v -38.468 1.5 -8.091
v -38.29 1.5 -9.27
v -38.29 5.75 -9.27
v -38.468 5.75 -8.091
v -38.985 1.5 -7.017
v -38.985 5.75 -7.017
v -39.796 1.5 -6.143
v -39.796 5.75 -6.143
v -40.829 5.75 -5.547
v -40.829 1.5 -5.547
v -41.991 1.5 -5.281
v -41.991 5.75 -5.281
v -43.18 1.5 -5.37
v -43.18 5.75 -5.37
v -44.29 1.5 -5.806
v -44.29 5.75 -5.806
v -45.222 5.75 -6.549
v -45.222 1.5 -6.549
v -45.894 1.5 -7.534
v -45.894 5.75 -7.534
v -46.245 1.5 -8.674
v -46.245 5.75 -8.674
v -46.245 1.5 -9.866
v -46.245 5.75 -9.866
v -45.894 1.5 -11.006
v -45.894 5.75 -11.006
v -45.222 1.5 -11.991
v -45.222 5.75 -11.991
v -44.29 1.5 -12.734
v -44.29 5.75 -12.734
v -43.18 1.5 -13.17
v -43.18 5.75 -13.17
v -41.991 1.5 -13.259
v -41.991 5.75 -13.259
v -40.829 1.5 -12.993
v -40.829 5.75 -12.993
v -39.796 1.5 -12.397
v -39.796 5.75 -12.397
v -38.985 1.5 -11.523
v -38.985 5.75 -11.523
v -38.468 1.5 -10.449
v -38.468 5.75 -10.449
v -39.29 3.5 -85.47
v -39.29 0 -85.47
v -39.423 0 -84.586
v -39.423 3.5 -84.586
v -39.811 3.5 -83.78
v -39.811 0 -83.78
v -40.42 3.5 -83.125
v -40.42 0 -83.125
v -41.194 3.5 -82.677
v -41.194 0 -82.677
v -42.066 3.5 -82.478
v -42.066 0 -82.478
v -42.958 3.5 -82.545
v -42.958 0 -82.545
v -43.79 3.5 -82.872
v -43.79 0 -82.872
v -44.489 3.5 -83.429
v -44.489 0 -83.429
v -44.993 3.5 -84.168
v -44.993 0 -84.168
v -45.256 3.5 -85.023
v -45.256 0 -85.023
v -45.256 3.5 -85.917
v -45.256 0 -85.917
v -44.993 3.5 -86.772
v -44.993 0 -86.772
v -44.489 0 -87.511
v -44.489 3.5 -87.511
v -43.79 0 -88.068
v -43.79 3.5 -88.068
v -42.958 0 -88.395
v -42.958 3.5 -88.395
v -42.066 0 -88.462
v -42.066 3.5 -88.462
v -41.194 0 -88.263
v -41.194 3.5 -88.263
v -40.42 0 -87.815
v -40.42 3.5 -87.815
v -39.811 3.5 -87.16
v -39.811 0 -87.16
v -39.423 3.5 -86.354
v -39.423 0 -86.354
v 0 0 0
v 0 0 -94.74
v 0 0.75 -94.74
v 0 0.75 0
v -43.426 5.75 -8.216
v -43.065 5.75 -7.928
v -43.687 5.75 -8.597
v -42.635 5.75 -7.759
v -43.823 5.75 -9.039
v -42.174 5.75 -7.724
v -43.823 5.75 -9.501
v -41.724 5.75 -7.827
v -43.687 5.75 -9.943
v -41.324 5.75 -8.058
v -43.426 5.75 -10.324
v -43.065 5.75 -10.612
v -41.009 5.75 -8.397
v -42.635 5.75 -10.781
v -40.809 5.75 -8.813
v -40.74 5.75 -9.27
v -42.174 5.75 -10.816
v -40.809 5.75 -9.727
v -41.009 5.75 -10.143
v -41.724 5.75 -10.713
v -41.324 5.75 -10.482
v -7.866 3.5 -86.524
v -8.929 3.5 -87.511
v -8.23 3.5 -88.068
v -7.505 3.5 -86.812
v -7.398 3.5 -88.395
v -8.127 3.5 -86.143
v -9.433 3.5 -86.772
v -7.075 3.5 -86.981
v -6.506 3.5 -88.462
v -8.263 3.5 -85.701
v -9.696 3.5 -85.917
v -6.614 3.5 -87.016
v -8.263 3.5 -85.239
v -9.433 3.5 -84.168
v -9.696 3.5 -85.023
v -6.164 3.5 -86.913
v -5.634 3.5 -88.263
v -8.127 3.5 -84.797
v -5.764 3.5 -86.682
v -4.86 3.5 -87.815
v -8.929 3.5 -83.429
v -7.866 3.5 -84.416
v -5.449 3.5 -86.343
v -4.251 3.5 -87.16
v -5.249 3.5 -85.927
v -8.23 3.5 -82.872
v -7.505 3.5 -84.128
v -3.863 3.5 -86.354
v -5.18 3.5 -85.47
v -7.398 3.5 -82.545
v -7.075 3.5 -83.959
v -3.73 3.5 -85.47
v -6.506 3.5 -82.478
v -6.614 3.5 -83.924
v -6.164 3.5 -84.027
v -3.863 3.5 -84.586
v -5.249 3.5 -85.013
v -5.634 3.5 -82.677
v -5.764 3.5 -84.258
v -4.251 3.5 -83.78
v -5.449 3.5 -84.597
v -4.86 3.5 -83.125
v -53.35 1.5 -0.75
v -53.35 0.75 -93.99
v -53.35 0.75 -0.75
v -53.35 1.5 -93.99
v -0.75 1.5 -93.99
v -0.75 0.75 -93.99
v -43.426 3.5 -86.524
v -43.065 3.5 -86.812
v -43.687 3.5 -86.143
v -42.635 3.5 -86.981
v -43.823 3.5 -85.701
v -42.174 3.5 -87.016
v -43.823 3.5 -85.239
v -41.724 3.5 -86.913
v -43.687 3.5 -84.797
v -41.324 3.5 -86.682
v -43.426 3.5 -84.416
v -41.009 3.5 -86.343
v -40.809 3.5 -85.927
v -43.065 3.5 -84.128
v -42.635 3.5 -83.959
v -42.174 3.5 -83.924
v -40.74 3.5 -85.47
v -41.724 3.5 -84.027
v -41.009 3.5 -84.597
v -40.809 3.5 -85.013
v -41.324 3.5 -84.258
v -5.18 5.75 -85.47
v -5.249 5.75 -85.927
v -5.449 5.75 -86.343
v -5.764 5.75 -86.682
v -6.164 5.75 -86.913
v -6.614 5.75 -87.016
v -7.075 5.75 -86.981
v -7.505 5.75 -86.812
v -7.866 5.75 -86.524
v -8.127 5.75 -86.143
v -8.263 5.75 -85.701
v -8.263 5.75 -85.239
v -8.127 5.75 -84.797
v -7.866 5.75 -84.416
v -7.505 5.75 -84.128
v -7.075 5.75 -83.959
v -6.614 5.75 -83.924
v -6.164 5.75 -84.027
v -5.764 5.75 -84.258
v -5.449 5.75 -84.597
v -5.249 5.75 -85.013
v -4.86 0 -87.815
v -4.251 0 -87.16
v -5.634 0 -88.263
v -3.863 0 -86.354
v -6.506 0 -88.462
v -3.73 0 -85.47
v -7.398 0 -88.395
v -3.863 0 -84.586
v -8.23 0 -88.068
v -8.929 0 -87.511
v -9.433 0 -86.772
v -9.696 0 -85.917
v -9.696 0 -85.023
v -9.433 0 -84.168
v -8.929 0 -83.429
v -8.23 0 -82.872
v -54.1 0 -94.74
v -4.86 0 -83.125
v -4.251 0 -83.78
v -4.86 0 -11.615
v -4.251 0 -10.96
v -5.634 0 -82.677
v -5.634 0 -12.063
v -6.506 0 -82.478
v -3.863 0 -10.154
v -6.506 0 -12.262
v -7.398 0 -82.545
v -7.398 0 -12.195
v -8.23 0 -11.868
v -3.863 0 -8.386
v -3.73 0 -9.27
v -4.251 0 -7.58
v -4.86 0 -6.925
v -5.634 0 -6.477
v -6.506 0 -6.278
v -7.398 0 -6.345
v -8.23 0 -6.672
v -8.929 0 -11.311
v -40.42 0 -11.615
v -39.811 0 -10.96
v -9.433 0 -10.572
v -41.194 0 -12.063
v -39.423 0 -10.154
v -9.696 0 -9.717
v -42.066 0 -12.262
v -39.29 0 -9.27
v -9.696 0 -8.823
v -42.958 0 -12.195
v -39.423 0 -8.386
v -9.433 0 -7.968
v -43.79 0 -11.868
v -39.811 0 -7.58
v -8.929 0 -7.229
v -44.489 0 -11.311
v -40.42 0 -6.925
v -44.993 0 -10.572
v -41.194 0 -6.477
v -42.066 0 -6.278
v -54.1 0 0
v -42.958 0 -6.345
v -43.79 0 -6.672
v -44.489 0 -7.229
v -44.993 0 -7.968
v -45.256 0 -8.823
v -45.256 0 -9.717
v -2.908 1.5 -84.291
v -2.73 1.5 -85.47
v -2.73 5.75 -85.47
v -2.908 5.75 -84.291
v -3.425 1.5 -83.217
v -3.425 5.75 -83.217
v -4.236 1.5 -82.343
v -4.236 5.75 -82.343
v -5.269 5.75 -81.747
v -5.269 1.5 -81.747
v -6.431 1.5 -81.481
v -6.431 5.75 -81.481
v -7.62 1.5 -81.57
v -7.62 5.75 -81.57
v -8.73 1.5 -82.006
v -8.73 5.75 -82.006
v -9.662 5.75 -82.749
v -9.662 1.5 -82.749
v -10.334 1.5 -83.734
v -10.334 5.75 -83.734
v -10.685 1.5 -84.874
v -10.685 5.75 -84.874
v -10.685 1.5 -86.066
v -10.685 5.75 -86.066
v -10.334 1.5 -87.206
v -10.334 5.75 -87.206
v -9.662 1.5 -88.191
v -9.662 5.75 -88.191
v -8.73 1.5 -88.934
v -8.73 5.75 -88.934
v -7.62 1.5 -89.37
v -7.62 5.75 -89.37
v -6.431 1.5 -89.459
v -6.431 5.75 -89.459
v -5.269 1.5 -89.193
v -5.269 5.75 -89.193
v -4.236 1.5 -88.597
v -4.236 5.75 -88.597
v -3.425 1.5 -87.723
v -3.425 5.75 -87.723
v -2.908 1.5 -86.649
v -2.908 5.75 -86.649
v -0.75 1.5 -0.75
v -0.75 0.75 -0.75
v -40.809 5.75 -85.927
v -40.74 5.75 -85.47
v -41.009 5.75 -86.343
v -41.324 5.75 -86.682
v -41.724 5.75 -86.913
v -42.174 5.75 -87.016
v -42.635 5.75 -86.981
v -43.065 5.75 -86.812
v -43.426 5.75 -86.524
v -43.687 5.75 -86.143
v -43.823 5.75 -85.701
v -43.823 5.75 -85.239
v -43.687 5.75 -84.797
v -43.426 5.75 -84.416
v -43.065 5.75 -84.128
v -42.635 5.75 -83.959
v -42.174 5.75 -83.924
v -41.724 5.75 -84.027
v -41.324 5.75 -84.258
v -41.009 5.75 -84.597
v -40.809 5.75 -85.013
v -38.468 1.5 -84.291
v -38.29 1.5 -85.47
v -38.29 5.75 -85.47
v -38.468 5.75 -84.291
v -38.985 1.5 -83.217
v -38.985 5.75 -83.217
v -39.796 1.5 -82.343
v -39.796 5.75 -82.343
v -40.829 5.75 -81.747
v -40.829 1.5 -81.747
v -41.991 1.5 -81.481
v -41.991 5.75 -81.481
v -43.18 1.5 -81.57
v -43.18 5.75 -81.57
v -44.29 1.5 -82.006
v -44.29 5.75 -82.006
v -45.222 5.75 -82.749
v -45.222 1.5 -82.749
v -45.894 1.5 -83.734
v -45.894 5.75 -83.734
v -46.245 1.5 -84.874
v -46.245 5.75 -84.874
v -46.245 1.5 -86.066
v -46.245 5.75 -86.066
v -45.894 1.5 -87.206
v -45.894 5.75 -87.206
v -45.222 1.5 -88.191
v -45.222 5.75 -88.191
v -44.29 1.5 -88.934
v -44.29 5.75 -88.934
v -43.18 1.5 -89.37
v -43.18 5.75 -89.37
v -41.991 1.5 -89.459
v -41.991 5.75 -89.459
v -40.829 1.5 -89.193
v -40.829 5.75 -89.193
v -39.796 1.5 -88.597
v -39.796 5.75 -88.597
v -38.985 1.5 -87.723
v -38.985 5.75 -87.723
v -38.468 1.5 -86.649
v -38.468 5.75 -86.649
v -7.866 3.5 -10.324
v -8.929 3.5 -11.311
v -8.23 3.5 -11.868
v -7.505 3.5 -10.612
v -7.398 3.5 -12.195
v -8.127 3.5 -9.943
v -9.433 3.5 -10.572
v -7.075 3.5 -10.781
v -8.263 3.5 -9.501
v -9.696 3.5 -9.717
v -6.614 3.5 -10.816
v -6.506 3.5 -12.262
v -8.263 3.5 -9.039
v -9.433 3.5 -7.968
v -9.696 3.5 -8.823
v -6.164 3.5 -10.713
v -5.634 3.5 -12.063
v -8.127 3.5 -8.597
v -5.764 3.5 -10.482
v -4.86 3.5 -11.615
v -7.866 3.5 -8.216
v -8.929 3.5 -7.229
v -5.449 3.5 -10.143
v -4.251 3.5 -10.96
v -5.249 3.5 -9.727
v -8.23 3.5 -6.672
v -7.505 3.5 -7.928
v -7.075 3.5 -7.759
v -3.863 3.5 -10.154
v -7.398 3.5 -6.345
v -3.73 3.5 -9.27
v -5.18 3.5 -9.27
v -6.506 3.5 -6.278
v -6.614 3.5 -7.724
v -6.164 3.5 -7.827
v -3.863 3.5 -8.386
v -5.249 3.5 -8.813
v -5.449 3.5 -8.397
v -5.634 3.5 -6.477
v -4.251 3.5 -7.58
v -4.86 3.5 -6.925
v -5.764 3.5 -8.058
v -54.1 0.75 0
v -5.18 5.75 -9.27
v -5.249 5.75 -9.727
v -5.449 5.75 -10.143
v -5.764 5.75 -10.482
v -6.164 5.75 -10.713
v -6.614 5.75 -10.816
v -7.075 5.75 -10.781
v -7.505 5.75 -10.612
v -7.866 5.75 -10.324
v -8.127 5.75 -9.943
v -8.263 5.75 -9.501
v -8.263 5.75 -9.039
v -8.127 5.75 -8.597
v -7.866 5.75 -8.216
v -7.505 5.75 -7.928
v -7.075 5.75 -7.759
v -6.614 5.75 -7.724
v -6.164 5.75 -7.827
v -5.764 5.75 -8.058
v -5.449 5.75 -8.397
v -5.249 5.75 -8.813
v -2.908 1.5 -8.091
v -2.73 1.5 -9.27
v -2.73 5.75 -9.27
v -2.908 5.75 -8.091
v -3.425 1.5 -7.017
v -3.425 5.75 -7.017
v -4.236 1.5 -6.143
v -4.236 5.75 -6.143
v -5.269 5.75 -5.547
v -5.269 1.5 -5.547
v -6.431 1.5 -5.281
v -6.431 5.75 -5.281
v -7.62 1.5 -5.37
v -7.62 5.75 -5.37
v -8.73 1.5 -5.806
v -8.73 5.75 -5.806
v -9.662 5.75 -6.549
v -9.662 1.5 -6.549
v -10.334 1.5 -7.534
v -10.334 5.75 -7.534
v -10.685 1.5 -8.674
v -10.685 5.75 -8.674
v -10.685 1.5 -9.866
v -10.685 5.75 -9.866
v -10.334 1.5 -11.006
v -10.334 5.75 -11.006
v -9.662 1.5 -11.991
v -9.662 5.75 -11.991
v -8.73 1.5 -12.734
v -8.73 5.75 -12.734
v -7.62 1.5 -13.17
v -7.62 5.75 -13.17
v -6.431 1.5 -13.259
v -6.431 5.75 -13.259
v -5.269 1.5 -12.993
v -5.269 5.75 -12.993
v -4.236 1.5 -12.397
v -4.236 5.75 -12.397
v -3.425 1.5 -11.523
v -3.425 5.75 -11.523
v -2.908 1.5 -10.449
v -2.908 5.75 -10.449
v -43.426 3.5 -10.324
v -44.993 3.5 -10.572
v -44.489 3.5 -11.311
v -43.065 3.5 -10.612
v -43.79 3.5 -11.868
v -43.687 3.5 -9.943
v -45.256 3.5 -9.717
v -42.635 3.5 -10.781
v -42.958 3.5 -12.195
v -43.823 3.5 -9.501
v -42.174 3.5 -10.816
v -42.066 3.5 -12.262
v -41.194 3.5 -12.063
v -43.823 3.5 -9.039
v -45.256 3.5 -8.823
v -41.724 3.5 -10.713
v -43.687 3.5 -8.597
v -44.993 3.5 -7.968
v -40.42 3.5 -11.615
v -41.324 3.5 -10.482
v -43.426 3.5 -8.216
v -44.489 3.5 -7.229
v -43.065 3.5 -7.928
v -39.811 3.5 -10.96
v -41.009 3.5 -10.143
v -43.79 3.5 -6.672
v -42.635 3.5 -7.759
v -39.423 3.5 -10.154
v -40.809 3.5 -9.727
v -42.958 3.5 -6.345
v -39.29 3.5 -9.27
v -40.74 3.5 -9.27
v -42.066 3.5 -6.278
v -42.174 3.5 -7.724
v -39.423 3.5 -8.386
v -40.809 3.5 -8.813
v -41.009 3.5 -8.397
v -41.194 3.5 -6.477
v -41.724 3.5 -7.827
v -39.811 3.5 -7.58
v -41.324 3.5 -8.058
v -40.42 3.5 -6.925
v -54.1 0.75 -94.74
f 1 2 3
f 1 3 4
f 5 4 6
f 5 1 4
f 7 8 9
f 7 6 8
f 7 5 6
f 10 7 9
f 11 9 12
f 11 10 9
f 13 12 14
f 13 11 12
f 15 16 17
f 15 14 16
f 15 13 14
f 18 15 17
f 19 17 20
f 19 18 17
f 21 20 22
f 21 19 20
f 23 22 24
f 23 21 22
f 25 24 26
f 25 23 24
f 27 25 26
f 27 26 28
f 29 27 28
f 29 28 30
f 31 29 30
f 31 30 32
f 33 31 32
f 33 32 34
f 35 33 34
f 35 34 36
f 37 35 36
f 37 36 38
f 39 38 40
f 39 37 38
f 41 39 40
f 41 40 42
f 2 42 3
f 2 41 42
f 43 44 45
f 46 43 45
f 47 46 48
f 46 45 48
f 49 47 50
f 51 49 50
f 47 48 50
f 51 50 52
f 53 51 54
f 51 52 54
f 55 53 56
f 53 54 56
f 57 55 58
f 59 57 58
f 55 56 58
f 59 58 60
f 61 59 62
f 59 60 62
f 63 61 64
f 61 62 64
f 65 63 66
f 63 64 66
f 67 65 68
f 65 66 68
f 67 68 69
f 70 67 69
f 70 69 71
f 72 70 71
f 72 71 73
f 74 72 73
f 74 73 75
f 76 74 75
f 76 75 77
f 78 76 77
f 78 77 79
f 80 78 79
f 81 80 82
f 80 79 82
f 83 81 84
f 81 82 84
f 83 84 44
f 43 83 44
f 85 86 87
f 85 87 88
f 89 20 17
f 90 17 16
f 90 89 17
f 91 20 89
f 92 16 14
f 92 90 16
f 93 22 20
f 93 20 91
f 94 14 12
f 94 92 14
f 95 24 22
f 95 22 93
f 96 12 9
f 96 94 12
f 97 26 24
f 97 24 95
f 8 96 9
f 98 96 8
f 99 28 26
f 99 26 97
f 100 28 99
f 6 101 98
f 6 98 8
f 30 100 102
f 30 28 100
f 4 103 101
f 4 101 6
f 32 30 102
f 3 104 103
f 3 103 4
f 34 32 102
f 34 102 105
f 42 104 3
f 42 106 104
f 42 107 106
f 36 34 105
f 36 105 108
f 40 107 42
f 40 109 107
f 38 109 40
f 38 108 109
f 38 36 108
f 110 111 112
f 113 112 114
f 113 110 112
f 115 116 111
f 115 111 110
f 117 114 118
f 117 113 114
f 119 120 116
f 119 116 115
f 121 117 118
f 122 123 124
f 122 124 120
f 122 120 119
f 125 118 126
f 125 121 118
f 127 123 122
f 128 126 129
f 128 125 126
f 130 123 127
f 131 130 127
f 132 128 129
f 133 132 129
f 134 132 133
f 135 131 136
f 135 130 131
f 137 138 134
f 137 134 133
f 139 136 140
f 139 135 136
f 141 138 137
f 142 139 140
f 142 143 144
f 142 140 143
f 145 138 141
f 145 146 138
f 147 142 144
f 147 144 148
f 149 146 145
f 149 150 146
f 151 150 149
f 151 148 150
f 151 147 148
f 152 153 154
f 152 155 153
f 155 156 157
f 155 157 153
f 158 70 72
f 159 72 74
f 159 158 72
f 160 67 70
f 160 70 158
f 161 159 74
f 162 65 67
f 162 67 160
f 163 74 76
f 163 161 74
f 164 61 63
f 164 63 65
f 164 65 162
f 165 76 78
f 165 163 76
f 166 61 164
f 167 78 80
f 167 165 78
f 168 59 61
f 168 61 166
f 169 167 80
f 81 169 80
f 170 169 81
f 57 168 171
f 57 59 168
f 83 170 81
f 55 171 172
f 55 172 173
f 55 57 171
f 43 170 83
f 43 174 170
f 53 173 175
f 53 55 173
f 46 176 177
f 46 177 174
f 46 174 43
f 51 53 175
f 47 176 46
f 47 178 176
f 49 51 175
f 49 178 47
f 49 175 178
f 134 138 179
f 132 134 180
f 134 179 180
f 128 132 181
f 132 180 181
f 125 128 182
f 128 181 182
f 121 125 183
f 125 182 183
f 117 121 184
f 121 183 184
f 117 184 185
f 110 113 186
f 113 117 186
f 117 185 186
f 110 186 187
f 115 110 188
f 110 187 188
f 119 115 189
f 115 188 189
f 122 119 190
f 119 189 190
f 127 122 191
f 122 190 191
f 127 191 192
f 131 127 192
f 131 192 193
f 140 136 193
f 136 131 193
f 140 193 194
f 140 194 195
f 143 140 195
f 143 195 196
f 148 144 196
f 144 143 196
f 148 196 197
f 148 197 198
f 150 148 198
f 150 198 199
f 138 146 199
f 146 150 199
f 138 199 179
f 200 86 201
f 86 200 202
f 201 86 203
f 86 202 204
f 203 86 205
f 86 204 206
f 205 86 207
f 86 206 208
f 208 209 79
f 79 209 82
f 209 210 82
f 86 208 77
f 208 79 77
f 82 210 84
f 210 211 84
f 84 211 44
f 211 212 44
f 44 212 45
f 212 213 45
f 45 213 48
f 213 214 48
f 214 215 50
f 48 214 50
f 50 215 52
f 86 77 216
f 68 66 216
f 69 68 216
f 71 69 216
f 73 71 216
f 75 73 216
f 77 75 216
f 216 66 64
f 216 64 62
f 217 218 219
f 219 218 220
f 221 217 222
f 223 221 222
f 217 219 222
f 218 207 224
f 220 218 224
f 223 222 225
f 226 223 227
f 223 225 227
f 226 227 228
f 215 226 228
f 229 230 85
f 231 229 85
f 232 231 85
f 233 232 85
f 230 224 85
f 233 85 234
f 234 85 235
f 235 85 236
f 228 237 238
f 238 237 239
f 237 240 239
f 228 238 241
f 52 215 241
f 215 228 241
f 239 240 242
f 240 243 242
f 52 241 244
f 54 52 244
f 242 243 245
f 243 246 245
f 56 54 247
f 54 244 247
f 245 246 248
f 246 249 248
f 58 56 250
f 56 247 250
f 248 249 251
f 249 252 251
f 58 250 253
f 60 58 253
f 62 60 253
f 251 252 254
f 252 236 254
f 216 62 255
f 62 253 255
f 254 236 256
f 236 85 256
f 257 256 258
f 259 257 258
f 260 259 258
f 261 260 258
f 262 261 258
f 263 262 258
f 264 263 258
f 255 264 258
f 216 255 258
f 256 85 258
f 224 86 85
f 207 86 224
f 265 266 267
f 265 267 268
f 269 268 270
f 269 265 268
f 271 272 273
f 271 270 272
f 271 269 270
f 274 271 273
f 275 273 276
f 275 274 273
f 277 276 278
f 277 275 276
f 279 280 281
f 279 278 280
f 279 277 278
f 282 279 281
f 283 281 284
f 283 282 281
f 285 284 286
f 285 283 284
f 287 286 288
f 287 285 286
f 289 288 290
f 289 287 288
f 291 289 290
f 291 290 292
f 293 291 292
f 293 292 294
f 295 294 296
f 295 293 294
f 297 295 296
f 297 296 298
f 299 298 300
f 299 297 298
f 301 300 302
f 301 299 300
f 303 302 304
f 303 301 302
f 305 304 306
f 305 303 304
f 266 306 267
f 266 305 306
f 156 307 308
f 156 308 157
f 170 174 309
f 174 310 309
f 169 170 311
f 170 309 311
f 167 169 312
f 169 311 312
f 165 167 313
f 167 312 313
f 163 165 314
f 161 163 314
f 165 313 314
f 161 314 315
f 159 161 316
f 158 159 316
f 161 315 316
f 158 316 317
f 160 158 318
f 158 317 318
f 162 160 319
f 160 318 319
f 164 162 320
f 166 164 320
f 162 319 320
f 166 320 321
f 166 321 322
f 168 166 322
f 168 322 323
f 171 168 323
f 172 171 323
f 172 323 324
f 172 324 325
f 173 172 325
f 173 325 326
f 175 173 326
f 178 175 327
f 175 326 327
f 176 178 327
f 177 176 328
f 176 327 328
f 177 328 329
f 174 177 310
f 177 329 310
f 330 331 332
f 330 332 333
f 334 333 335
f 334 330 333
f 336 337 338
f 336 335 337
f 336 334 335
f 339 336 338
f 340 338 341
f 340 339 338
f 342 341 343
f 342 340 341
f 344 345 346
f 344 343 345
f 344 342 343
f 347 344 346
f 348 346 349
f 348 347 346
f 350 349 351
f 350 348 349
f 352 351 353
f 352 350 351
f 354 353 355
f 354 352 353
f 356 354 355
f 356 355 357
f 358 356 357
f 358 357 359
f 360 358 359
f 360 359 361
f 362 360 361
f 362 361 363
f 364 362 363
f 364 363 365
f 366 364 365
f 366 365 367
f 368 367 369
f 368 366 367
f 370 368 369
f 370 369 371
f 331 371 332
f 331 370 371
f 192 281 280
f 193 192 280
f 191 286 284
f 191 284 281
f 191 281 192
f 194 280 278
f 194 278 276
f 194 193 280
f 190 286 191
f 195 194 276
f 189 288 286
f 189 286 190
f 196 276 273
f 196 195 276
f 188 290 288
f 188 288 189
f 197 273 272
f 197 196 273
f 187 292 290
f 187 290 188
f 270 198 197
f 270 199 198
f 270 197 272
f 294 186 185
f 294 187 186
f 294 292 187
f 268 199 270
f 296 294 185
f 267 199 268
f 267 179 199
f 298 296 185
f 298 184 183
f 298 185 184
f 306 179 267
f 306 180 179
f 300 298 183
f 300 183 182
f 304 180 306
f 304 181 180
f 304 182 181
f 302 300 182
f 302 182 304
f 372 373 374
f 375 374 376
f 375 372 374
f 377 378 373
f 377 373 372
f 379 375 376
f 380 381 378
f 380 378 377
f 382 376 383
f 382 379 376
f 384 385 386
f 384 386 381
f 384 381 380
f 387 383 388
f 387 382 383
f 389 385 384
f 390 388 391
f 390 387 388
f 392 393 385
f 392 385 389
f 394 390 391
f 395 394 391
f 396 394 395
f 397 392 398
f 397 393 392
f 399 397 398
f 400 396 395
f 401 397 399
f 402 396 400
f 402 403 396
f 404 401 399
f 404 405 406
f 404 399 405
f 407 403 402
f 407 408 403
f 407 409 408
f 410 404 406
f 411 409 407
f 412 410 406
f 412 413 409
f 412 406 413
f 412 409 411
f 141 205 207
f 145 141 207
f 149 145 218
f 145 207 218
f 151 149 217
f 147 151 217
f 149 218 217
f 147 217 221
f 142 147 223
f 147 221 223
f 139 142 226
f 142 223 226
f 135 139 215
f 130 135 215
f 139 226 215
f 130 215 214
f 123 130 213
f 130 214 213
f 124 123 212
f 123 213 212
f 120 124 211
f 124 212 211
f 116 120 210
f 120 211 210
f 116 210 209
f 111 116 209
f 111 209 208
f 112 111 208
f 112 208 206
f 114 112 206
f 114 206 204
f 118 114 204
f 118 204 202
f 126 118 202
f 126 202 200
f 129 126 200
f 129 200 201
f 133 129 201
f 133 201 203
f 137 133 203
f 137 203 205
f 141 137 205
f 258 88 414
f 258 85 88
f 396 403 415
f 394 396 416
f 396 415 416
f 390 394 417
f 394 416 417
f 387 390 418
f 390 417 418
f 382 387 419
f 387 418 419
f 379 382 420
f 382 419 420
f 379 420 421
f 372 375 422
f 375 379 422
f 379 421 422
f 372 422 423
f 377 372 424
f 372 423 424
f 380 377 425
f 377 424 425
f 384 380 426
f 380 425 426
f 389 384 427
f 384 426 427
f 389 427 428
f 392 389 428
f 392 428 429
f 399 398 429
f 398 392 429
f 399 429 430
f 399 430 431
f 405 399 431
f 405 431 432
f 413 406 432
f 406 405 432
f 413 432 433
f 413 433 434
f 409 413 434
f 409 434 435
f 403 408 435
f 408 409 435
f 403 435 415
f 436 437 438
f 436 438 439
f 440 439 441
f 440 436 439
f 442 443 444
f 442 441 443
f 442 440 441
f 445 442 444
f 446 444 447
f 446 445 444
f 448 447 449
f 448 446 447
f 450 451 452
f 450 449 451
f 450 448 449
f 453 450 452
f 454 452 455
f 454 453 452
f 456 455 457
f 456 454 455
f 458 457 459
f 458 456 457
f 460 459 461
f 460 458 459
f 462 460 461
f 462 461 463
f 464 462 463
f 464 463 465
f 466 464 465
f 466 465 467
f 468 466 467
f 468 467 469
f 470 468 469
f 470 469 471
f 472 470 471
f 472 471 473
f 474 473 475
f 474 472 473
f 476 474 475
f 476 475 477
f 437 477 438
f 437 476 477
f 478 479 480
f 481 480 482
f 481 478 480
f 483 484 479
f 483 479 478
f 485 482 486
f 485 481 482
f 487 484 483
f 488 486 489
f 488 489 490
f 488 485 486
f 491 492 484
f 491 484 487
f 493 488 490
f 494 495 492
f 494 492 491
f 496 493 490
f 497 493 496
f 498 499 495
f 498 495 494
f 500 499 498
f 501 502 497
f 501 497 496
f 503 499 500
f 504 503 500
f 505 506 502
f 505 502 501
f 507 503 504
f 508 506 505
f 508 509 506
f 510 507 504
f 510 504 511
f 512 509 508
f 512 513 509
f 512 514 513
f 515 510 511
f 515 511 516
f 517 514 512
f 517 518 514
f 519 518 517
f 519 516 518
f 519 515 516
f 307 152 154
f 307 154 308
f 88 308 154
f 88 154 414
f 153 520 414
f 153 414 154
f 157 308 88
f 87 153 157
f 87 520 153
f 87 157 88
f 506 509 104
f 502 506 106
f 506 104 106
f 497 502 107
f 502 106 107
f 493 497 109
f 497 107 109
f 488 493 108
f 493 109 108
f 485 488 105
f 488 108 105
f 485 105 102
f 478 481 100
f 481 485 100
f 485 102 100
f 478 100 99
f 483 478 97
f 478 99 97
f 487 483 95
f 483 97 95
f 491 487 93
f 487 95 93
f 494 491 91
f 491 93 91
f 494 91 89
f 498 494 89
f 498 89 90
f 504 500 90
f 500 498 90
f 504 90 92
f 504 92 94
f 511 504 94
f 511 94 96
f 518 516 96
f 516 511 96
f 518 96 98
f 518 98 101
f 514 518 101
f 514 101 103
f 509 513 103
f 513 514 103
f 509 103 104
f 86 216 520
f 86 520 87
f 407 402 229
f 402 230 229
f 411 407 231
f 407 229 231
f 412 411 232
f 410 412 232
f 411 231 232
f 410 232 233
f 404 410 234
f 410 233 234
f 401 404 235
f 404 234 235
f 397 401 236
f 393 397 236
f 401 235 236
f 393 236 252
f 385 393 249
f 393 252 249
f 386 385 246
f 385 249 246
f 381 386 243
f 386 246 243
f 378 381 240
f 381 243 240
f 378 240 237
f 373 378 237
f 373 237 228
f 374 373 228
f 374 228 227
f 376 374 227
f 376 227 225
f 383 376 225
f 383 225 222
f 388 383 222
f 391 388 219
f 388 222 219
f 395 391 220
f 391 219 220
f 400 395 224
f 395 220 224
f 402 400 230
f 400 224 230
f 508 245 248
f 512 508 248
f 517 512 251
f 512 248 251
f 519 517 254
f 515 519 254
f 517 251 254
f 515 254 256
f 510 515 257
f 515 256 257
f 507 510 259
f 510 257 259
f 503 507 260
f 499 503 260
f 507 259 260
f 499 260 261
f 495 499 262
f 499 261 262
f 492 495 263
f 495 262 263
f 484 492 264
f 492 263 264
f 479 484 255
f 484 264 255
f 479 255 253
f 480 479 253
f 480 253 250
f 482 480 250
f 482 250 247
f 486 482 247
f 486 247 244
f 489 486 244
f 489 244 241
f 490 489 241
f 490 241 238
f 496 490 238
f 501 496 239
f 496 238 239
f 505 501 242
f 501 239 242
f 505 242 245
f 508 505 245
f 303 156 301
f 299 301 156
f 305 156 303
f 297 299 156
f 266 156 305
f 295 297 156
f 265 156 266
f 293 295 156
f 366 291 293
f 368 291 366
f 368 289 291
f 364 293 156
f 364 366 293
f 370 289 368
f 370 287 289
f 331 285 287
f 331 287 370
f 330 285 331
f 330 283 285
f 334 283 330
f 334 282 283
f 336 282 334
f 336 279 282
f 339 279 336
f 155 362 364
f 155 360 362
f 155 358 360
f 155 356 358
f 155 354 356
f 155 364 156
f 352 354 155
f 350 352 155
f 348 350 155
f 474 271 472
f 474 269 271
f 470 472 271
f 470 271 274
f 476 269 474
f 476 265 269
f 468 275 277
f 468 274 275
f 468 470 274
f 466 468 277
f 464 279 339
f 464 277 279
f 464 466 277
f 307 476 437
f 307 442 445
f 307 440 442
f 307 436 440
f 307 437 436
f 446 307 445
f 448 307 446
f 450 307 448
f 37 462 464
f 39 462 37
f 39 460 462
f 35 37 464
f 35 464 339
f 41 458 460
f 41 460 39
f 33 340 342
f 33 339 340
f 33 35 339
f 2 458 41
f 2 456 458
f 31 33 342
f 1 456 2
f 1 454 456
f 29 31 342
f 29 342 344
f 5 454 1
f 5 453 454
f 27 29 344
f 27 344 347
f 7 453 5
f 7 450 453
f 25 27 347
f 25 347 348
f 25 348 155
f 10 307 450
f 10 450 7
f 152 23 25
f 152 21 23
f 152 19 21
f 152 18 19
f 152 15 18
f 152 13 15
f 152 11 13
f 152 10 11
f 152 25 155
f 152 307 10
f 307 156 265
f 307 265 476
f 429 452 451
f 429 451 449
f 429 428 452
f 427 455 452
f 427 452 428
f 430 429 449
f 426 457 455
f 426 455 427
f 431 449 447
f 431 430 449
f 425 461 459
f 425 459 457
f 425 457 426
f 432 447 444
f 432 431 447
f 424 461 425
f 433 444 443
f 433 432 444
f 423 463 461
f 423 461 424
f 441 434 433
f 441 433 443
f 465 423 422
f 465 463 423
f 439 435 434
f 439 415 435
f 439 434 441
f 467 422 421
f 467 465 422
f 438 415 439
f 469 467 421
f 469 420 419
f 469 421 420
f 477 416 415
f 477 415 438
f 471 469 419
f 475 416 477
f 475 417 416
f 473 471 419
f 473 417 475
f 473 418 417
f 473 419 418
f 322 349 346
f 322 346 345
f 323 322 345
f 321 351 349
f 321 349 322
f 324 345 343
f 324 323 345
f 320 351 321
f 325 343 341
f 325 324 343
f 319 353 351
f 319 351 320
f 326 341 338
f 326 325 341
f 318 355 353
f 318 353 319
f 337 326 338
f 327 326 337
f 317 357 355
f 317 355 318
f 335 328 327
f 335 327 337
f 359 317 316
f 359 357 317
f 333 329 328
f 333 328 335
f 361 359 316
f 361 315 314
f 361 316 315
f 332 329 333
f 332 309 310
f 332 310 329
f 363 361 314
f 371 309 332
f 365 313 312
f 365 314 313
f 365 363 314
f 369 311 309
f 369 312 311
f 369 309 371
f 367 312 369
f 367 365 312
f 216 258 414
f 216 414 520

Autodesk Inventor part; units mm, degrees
ref_plane "YZ Plane" through (0, 0, 0) normal (1, 0, 0) x (0, 1, 0)
ref_plane "XZ Plane" through (0, 0, 0) normal (0, 1, 0) x (-1, 0, 0)
ref_plane "XY Plane" through (0, 0, 0) normal (0, 0, 1) x (1, 0, 0)
sketch "Skizze1" plane through (0, 0, 0) normal (0, 1, 0) x (-1, 0, 0)
  line L0 (0, 0) -> (54.1, 0)
  line L1 (54.1, 0) -> (54.1, -94.74)
  line L2 (54.1, -94.74) -> (0, -94.74)
  line L3 (0, -94.74) -> (0, 0)
  dimension "d0" = 94.74
  dimension "d1" = 54.1
extrude "Extrusion1" add sketch "Skizze1" along normal blind 1.5
sketch "Skizze2" plane through (0, 1.5, 0) normal (0, 1, 0) x (1, 0, 0)
  line L0 (-54.1, 0) -> (0, 0) projected
  line L1 (0, 94.74) -> (-54.1, 94.74) projected
  line L2 (0, 0) -> (-54.1, 0)
  line L3 (-54.1, 0) -> (-54.1, 94.74)
  line L4 (-54.1, 94.74) -> (0, 94.74)
  line L5 (0, 94.74) -> (0, 0)
  line L6 (-53.35, 93.99) -> (-53.35, 0.75)
  line L7 (-53.35, 0.75) -> (-0.75, 0.75)
  line L8 (-0.75, 0.75) -> (-0.75, 93.99)
  line L9 (-0.75, 93.99) -> (-53.35, 93.99)
  dimension "d4" = 0.75
extrude "Extrusion2" cut sketch "Skizze2" against normal blind 0.75
sketch "Skizze3" plane through (0, 1.5, 0) normal (0, 1, 0) x (1, 0, 0)
  circle A0 centre (-42.29, 9.27) radius 4
  circle A1 centre (-42.29, 85.47) radius 4
  circle A2 centre (-6.73, 85.47) radius 4
  circle A3 centre (-6.73, 9.27) radius 4
  line L0 (0, 0) -> (-54.1, 0) projected
  line L1 (-0.75, 0.75) -> (-0.75, 93.99) projected
  line L2 (-53.35, 0.75) -> (-0.75, 0.75) projected
  dimension "d7" = 8
  dimension "d8" = 8
  dimension "d9" = 8
  dimension "d10" = 8
  dimension "d12" = 5.98
  dimension "d13" = 5.98
  dimension "d14" = 35.56
  dimension "d15" = 35.56
  dimension "d16" = 8.52
  dimension "d17" = 76.2
extrude "Extrusion3" add sketch "Skizze3" along normal blind 4.25
sketch "Skizze4" plane through (-42.29, 5.75, -9.27) normal (0, 1, 0) x (1, 0, 0)
  circle A0 centre (0, 0) radius 4 projected
  circle A1 centre (0, 0) radius 1.55
  circle A2 centre (35.56, 0) radius 4 projected
  circle A3 centre (35.56, 0) radius 1.55
  circle A4 centre (35.56, 76.2) radius 4 projected
  circle A5 centre (35.56, 76.2) radius 1.55
  circle A6 centre (0, 76.2) radius 4 projected
  circle A7 centre (0, 76.2) radius 1.55
  point P0 (42.29, -9.27)
  dimension "d20" = 3.1
  dimension "d21" = 3.1
  dimension "d22" = 3.1
  dimension "d23" = 3.1
extrude "Extrusion4" cut sketch "Skizze4" against normal blind 10 contours A1 | A3 | A5 | A7
sketch "Skizze5" plane through (0, 0, 0) normal (0, -1, 0) x (1, 0, 0)
  circle A0 centre (-6.73, -9.27) radius 1.55 projected
  circle A1 centre (-6.73, -9.27) radius 3
  circle A2 centre (-42.29, -9.27) radius 1.55 projected
  circle A3 centre (-42.29, -9.27) radius 3
  circle A4 centre (-42.29, -85.47) radius 4 projected
  circle A5 centre (-42.29, -85.47) radius 3
  circle A6 centre (-6.73, -85.47) radius 1.55 projected
  circle A7 centre (-6.73, -85.47) radius 3
  point P0 (0, 0)
  dimension "d26" = 6
  dimension "d27" = 6
  dimension "d28" = 6
  dimension "d29" = 6
extrude "Extrusion5" cut sketch "Skizze5" against normal blind 3.5 contours A1 | A3 | A5 | A7
properties part number "Bottom"
